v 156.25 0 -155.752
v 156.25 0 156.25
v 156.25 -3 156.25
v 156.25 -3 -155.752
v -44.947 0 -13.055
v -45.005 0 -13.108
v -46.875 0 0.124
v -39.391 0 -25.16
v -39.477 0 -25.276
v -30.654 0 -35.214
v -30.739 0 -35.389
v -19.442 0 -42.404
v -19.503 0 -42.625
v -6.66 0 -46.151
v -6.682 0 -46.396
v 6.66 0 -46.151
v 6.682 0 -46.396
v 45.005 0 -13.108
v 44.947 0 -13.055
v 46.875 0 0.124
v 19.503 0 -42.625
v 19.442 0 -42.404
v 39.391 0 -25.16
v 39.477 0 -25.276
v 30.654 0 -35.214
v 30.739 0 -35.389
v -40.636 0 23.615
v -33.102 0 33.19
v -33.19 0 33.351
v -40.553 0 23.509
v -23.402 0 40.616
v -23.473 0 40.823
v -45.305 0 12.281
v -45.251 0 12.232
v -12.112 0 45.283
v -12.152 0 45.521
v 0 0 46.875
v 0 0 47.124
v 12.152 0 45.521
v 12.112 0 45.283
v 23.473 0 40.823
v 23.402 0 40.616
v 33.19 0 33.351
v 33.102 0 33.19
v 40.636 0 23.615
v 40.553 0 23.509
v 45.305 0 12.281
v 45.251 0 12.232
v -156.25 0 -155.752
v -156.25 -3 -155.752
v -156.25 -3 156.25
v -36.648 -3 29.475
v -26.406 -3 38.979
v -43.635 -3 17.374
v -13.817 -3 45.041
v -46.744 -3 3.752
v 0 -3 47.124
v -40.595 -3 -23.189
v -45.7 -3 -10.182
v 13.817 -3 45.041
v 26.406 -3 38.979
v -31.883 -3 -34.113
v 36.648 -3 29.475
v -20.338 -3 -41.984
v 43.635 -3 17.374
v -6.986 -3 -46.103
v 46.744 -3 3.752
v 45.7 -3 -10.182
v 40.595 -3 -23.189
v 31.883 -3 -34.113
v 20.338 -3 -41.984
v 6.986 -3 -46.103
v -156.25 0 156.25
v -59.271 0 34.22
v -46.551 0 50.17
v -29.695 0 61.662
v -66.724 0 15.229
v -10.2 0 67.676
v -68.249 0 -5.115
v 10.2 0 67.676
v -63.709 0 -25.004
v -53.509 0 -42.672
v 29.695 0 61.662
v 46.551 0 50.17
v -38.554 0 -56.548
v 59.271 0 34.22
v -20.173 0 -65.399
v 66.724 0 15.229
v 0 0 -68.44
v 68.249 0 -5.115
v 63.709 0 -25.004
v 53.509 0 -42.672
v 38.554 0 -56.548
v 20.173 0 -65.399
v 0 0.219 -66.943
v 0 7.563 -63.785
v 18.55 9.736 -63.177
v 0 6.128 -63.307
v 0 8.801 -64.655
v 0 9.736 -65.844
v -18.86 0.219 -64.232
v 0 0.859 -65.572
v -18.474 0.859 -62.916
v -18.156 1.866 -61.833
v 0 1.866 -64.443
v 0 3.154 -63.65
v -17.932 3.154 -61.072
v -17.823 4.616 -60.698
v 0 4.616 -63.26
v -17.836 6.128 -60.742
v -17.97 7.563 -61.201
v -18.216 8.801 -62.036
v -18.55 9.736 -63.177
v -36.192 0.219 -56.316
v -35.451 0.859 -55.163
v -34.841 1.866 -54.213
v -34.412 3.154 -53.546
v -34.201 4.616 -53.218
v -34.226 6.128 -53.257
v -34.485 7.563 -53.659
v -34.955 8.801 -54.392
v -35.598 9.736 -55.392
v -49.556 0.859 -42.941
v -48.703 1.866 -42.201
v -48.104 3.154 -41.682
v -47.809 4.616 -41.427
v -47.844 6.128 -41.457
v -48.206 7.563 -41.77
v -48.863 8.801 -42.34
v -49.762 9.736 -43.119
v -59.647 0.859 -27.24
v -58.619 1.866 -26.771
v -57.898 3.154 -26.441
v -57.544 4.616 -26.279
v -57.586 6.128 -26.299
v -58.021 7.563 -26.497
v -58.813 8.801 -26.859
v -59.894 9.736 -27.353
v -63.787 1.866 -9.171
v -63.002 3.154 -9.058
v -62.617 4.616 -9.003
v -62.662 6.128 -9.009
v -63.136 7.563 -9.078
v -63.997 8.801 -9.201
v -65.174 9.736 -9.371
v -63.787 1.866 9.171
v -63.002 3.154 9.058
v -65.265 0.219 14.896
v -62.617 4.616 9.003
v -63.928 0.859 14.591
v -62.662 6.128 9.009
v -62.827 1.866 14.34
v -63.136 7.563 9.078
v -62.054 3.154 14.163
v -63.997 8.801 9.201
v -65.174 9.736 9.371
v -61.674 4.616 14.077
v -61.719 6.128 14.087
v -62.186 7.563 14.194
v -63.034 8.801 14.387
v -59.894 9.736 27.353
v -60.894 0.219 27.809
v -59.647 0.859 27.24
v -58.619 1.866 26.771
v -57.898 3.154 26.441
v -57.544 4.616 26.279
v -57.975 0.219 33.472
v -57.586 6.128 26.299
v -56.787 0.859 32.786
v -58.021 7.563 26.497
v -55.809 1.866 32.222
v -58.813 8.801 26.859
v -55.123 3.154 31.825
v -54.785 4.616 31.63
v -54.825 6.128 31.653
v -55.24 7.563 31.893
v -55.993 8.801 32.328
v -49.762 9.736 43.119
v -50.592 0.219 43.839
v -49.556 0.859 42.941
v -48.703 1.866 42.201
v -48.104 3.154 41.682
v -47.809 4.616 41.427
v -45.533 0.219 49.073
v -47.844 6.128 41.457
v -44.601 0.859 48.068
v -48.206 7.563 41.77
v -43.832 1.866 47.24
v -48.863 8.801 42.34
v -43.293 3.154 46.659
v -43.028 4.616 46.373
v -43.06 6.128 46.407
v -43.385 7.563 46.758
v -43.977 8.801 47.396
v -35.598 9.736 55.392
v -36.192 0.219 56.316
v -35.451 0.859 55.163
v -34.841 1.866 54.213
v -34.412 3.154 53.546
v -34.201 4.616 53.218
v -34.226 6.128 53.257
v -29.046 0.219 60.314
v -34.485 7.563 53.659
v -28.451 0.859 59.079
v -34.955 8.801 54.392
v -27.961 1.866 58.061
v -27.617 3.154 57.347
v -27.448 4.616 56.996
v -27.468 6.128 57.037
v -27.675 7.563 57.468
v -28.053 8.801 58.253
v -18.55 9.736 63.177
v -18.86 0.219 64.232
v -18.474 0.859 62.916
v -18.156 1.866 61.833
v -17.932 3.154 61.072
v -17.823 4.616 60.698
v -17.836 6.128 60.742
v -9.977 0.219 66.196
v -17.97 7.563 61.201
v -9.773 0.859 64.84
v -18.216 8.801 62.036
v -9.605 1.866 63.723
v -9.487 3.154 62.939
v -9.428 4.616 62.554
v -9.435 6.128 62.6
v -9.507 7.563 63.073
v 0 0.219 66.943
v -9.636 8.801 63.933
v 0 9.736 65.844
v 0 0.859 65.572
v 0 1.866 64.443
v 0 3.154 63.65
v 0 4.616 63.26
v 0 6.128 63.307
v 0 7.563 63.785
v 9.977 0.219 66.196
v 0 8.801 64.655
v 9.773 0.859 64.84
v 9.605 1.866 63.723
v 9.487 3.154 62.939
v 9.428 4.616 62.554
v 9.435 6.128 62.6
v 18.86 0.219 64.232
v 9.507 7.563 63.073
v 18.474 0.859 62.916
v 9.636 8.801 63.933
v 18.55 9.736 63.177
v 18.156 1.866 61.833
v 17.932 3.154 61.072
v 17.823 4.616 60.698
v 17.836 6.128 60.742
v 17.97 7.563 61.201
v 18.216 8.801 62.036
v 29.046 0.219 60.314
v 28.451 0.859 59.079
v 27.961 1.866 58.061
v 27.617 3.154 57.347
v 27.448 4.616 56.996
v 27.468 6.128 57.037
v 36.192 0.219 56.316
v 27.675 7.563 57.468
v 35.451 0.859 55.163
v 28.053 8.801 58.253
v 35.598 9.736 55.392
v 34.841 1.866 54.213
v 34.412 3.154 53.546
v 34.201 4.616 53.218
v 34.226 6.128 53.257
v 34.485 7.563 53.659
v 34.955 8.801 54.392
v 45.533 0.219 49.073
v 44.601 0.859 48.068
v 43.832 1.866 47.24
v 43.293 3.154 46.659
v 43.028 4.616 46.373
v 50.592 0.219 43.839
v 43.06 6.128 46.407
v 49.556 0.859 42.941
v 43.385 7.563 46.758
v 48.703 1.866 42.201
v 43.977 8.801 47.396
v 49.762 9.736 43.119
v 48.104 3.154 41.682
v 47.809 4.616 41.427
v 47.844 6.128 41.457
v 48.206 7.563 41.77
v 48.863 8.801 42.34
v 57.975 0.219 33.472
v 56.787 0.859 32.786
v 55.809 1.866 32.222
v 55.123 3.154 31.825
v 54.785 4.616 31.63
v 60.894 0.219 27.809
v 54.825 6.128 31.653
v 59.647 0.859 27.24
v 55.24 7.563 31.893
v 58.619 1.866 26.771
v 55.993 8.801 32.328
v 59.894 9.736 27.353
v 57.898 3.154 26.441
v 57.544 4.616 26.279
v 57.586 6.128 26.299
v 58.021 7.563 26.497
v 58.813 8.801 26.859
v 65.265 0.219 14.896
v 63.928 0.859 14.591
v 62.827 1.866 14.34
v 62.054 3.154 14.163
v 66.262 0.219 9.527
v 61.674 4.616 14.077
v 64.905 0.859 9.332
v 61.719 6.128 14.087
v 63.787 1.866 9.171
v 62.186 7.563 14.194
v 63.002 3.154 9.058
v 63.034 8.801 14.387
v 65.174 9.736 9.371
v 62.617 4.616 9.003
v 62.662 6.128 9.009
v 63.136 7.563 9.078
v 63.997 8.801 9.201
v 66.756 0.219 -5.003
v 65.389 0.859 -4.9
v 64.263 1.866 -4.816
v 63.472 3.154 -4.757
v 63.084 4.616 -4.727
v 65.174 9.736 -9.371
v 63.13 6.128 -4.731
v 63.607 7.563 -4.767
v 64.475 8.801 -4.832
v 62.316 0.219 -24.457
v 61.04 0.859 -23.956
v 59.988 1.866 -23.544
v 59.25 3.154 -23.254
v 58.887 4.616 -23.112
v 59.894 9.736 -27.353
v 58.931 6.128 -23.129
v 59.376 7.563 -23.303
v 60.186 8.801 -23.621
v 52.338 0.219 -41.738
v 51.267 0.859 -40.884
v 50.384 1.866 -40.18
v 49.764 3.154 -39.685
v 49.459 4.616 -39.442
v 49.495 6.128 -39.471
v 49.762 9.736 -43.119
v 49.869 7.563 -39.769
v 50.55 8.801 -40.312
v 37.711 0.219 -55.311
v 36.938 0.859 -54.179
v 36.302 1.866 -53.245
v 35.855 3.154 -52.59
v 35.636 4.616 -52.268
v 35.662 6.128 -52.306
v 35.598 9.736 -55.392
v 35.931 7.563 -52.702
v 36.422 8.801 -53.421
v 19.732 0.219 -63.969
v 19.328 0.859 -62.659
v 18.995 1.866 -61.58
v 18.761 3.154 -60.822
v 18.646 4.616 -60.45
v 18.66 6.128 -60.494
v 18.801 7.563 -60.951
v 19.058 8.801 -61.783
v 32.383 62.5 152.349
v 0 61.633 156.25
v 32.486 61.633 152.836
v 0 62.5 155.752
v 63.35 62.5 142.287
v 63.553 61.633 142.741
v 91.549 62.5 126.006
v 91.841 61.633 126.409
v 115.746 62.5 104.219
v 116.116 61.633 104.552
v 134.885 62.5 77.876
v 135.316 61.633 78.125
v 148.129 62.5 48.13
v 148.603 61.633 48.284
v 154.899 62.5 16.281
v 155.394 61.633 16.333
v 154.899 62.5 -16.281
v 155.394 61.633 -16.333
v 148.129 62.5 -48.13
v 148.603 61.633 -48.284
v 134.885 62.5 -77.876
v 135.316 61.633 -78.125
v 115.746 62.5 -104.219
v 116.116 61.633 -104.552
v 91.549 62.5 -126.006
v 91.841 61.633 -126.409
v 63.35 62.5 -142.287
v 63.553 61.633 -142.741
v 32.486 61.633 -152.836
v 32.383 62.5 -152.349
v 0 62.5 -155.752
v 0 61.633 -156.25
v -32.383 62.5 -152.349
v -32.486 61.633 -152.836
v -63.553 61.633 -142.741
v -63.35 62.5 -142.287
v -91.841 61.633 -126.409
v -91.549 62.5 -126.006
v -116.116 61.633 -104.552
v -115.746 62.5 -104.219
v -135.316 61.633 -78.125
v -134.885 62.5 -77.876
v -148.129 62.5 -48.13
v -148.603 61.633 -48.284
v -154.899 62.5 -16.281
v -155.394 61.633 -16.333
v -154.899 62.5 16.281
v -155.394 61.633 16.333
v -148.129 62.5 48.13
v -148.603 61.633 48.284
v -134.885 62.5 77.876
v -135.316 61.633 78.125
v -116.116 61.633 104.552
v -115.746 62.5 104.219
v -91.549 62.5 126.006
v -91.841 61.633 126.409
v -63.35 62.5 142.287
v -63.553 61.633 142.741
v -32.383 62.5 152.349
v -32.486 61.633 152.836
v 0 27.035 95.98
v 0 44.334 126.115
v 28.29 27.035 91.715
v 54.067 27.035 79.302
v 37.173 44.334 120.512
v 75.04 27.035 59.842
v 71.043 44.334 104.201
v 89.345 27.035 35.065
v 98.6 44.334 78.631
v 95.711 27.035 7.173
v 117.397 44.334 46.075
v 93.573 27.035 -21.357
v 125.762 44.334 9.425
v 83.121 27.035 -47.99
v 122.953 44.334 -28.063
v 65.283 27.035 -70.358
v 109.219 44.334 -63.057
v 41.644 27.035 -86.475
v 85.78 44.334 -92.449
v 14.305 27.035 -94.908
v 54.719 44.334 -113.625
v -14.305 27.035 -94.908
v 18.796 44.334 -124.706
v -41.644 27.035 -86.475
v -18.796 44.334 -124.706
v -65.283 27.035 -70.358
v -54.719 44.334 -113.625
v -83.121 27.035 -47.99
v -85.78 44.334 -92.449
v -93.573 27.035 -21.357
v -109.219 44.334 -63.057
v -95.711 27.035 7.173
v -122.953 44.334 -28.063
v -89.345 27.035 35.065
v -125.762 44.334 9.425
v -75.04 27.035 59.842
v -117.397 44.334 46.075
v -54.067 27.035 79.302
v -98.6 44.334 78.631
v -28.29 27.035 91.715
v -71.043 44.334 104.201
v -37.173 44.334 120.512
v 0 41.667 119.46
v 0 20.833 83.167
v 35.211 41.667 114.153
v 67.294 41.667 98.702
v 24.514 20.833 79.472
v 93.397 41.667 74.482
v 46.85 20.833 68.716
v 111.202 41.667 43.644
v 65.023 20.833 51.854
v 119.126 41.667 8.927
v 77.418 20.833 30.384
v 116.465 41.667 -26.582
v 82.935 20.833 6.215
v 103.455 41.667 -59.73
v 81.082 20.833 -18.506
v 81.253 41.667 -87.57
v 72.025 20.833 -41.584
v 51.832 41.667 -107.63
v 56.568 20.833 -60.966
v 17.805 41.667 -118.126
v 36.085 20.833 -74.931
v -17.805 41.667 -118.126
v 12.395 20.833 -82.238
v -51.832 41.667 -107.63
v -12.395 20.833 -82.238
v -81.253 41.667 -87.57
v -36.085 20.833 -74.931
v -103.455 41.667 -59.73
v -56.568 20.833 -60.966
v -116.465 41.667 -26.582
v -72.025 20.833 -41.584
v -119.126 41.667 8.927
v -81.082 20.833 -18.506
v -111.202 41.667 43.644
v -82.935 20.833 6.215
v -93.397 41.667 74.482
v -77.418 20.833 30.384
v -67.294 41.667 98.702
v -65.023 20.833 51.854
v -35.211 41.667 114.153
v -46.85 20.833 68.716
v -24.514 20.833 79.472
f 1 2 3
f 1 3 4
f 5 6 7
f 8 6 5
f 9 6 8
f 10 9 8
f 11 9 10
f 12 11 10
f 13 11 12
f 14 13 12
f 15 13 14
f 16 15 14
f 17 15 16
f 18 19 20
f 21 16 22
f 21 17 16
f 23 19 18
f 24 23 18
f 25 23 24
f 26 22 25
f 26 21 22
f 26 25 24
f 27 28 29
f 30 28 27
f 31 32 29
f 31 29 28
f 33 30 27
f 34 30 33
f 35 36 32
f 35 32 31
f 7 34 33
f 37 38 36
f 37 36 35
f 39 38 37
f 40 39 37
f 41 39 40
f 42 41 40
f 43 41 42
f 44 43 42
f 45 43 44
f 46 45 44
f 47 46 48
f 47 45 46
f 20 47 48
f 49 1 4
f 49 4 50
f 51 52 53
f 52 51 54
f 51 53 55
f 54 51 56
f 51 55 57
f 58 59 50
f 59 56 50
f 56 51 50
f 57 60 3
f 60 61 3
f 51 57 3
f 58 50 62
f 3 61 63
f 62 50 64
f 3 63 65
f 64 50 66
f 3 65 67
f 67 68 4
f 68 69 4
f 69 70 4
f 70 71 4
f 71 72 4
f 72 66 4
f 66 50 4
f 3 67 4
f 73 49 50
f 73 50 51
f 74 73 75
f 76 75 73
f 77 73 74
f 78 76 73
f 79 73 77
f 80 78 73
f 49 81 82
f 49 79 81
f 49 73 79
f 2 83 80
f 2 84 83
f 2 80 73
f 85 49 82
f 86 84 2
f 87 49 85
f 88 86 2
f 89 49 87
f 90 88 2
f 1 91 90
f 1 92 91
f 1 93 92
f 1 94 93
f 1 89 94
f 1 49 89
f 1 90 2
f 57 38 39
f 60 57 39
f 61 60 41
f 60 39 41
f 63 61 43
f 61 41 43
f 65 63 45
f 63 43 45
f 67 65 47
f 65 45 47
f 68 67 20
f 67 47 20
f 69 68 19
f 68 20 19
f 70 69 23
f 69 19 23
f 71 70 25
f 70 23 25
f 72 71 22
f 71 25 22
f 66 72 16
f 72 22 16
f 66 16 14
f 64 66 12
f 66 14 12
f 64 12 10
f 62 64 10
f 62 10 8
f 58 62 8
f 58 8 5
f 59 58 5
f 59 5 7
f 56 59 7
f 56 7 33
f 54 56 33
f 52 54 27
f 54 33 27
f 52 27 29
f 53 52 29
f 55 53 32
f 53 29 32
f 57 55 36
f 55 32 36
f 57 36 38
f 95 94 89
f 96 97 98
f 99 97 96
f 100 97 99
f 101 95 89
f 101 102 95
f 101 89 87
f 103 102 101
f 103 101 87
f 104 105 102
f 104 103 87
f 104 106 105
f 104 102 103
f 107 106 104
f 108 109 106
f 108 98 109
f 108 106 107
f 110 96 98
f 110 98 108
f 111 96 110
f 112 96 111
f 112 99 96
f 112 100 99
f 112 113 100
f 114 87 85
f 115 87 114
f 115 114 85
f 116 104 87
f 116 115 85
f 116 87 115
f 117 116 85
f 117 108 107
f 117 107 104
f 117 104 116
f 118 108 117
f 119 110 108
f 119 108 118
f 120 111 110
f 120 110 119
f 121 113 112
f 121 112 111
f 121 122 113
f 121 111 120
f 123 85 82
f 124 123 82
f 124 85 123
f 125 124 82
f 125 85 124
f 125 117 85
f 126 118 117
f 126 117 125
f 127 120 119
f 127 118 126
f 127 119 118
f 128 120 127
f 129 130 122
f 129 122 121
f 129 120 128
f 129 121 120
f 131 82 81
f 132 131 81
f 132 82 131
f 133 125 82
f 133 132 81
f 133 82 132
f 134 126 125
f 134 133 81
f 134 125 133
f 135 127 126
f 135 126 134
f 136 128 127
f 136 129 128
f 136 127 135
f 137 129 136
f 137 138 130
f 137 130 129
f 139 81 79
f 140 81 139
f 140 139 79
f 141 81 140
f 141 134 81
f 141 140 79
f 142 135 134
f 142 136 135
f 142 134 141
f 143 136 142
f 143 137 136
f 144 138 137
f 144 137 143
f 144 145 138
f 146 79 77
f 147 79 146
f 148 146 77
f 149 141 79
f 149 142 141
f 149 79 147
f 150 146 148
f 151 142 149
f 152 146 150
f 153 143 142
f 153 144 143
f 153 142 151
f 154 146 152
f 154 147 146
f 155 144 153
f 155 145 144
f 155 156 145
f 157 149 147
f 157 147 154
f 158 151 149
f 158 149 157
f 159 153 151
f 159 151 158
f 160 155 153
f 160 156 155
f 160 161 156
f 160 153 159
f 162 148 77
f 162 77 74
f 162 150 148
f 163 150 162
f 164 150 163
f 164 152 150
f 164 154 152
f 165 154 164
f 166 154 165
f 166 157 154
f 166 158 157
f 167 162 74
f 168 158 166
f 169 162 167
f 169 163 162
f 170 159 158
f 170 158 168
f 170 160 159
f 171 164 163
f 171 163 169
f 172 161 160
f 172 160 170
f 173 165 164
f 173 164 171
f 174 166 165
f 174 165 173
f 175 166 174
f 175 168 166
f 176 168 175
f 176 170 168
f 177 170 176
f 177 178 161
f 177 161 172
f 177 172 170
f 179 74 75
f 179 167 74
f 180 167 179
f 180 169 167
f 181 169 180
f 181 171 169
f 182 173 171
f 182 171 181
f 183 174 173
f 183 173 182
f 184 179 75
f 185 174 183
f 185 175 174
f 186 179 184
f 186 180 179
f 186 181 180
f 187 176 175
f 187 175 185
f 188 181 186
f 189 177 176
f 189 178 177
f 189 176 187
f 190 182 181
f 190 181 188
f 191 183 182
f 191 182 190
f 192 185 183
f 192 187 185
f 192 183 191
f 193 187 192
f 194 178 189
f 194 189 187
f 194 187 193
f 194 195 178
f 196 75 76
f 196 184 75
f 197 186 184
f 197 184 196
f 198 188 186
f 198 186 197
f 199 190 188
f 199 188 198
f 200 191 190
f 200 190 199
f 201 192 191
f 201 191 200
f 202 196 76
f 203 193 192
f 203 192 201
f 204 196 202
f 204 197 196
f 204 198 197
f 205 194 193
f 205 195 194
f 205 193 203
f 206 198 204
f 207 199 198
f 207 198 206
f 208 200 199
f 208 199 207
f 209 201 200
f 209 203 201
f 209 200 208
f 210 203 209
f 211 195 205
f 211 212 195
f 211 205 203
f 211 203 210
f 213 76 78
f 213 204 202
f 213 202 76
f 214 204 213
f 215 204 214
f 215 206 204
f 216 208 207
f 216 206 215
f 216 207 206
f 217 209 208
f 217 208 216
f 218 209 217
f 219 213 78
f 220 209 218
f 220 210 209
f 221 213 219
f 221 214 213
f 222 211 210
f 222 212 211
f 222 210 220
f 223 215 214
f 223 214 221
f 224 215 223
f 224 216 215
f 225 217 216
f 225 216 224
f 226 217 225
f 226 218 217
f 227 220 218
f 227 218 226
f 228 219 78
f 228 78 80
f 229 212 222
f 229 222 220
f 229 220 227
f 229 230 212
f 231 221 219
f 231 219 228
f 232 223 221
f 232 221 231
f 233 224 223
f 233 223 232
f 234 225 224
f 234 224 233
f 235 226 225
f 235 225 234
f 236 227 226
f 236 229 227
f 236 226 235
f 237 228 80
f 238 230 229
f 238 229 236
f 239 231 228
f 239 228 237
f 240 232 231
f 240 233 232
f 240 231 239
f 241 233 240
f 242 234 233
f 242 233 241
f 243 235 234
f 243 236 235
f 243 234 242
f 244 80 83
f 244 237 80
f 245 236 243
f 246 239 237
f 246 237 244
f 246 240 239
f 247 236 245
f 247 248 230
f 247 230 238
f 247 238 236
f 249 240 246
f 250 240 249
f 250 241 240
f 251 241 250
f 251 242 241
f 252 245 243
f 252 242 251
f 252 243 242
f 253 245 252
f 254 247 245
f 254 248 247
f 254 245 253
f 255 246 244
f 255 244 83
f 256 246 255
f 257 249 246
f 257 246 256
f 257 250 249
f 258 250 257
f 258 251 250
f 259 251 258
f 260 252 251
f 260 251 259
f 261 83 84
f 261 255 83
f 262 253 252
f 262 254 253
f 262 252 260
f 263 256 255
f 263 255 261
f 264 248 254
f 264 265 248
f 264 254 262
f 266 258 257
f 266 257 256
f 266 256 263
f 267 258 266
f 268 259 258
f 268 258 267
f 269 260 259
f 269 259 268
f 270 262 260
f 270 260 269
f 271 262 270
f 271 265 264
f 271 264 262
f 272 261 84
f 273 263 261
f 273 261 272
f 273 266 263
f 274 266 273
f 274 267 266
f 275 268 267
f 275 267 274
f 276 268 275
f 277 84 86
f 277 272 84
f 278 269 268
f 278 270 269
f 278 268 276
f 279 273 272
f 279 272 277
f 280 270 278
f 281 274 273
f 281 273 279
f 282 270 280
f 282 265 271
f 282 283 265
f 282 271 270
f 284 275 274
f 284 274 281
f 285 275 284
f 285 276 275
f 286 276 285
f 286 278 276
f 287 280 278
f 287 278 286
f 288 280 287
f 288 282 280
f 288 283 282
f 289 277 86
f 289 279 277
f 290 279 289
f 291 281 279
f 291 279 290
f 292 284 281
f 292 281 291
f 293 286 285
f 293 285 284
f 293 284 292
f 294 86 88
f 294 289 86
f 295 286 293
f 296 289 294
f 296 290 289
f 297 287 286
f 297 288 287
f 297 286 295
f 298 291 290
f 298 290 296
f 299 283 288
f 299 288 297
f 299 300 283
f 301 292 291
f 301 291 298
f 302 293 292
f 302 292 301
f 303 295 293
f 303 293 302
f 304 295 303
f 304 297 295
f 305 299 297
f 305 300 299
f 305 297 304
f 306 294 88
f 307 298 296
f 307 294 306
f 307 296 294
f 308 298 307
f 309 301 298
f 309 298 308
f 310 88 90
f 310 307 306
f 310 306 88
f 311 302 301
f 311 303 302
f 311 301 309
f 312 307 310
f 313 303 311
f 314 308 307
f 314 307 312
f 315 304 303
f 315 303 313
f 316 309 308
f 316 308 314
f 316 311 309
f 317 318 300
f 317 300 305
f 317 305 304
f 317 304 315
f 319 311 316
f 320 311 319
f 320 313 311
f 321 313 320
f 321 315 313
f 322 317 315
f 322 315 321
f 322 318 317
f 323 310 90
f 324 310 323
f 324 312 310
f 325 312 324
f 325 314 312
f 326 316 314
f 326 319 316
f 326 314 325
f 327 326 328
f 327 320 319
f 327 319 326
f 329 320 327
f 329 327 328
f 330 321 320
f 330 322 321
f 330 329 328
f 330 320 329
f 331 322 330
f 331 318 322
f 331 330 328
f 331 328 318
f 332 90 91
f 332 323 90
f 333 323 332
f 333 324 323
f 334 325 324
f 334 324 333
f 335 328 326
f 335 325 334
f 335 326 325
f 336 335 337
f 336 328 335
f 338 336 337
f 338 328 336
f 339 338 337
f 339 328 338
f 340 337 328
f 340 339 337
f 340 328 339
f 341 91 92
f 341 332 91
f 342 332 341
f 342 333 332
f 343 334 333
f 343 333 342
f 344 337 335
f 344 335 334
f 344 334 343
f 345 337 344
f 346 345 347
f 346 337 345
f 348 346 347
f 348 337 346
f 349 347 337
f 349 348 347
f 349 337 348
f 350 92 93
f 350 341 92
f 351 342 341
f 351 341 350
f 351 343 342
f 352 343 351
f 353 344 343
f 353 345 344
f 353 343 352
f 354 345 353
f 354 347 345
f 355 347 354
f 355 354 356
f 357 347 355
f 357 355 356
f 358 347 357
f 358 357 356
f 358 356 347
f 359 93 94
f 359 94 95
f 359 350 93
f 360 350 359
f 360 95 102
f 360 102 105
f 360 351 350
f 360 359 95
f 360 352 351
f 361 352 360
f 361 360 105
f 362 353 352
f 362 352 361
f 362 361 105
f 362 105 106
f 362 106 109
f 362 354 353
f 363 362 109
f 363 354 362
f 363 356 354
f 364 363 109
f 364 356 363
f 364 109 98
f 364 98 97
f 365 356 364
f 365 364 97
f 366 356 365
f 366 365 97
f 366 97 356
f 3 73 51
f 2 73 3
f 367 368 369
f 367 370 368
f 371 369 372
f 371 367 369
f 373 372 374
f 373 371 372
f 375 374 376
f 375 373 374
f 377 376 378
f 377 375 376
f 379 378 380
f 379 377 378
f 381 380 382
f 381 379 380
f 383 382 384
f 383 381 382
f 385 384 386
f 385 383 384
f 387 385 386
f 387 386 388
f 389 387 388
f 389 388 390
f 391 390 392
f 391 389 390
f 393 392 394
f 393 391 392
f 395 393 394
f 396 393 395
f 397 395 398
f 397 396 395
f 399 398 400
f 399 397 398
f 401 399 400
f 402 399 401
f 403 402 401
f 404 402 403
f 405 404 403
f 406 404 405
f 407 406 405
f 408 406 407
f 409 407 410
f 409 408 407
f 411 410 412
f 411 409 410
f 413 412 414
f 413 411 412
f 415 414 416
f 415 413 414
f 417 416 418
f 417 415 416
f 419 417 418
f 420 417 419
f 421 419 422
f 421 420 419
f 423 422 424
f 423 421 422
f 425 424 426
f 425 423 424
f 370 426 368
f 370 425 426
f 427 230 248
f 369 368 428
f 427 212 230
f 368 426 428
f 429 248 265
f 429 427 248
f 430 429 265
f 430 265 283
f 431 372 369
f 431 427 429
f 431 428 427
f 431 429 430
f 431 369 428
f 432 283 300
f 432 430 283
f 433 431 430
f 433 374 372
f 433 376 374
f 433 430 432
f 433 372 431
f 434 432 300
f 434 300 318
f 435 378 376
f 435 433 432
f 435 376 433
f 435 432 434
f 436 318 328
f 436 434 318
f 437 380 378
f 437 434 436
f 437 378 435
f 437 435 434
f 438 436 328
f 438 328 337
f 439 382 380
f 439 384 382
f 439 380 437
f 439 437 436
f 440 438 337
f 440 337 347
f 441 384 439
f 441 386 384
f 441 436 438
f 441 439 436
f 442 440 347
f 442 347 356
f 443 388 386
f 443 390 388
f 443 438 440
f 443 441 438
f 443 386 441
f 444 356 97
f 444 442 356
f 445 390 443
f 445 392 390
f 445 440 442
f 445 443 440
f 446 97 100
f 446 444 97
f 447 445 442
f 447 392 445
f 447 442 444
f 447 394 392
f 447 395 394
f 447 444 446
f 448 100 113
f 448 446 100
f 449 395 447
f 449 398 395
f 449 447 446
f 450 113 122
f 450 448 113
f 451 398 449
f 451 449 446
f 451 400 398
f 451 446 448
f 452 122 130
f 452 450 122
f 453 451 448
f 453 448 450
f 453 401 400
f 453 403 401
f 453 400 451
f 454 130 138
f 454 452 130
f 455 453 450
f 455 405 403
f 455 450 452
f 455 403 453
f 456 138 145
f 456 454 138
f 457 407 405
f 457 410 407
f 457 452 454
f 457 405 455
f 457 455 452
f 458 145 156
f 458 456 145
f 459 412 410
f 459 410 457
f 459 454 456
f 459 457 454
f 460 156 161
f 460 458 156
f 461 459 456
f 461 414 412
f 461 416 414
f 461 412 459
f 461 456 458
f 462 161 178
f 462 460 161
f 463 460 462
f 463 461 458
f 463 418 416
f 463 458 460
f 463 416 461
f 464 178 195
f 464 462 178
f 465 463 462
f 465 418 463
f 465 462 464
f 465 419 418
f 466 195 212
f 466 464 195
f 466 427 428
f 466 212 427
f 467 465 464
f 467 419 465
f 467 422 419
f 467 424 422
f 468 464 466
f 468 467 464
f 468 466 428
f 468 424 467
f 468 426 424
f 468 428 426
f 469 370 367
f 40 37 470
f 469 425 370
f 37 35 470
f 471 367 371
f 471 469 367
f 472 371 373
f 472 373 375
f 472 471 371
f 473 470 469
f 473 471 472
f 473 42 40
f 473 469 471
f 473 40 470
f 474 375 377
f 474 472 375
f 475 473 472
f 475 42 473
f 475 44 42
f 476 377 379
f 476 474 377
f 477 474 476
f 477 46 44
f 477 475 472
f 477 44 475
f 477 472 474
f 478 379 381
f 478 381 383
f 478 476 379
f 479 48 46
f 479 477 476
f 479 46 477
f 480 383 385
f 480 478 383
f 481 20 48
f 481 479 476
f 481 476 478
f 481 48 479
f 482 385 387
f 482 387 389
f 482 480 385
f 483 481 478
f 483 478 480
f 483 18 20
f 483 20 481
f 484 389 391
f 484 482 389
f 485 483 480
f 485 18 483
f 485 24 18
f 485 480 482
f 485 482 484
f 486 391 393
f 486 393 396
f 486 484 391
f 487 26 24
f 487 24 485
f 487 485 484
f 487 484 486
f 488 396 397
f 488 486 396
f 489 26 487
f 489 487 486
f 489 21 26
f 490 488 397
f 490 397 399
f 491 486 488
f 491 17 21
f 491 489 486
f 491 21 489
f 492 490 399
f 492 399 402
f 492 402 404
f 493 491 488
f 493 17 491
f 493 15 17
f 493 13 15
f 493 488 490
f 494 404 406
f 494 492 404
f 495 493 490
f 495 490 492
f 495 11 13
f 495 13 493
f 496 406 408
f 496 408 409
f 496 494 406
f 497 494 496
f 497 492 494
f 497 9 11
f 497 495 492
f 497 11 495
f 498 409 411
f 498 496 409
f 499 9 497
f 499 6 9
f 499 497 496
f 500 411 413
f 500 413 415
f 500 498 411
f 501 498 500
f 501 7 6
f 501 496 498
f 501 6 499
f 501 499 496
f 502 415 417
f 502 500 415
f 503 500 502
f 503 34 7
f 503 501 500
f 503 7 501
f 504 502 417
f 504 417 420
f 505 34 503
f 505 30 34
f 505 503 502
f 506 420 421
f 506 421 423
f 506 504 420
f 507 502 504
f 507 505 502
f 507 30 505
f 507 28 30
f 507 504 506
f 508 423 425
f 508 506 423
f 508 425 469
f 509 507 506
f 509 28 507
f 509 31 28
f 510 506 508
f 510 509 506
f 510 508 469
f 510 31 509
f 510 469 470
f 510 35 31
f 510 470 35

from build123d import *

# Parameters (mm, degrees)
SKETCH2_R           = 46.875
BOSS_EXTRUDE1_DEPTH = 3


with BuildPart() as part:
    # Sketch1 → Revolve1 (revolve)
    with BuildSketch(Plane.XY, mode=Mode.PRIVATE) as revolve1_sk:
        Polygon((-48.883652299488276, 0), (-156.25, 61.6327346895418), (-155.75215375739506, 62.5), (-46.875, 0), align=None)
    revolve(revolve1_sk.sketch.rotate(Axis((0, 0, 0), (0, 1, 0)), 90), axis=Axis((0, 0, 0), (0, 1, 0)))



with BuildPart() as body_2:
    # Sketch2 → Boss-Extrude1 (new body)
    with BuildSketch(Plane(origin=(0, 0, 0), x_dir=(1, 0, 0), z_dir=(0, 1, 0))):
        Polygon((-156.24999999999994, -156.25), (156.25000000000003, -156.25), (156.25, 155.75215375739506), (-156.24999999999994, 155.75215375739506), align=None)
        with Locations(Location((8.327e-14, -0.24892312130248007, 0), (0, 0, 270))):
            Circle(SKETCH2_R, mode=Mode.SUBTRACT)
    extrude(amount=-BOSS_EXTRUDE1_DEPTH)


with BuildPart() as part_1:
    add(part.part)

    add(body_2.part)  # Revolve2 merges body 2
    # Sketch3 → Revolve2 (revolve)
    with BuildSketch(Plane.XY, mode=Mode.PRIVATE) as revolve2_sk:
        with BuildLine():
            Line((-65.84427513417332, 9.73610064724726), (-48.88365229948828, 0))
            Line((-48.88365229948828, 0), (-68.44009325263127, 0))
            ThreePointArc((-68.44009325263127, 0), (-63.40199024858691, 3.8708478952321843), (-65.84427513417332, 9.73610064724726))
        make_face()
    revolve(revolve2_sk.sketch.rotate(Axis((0, 0, 0), (0, 1, 0)), 270), axis=Axis((0, 0, 0), (0, 1, 0)))


solid = part_1.part
